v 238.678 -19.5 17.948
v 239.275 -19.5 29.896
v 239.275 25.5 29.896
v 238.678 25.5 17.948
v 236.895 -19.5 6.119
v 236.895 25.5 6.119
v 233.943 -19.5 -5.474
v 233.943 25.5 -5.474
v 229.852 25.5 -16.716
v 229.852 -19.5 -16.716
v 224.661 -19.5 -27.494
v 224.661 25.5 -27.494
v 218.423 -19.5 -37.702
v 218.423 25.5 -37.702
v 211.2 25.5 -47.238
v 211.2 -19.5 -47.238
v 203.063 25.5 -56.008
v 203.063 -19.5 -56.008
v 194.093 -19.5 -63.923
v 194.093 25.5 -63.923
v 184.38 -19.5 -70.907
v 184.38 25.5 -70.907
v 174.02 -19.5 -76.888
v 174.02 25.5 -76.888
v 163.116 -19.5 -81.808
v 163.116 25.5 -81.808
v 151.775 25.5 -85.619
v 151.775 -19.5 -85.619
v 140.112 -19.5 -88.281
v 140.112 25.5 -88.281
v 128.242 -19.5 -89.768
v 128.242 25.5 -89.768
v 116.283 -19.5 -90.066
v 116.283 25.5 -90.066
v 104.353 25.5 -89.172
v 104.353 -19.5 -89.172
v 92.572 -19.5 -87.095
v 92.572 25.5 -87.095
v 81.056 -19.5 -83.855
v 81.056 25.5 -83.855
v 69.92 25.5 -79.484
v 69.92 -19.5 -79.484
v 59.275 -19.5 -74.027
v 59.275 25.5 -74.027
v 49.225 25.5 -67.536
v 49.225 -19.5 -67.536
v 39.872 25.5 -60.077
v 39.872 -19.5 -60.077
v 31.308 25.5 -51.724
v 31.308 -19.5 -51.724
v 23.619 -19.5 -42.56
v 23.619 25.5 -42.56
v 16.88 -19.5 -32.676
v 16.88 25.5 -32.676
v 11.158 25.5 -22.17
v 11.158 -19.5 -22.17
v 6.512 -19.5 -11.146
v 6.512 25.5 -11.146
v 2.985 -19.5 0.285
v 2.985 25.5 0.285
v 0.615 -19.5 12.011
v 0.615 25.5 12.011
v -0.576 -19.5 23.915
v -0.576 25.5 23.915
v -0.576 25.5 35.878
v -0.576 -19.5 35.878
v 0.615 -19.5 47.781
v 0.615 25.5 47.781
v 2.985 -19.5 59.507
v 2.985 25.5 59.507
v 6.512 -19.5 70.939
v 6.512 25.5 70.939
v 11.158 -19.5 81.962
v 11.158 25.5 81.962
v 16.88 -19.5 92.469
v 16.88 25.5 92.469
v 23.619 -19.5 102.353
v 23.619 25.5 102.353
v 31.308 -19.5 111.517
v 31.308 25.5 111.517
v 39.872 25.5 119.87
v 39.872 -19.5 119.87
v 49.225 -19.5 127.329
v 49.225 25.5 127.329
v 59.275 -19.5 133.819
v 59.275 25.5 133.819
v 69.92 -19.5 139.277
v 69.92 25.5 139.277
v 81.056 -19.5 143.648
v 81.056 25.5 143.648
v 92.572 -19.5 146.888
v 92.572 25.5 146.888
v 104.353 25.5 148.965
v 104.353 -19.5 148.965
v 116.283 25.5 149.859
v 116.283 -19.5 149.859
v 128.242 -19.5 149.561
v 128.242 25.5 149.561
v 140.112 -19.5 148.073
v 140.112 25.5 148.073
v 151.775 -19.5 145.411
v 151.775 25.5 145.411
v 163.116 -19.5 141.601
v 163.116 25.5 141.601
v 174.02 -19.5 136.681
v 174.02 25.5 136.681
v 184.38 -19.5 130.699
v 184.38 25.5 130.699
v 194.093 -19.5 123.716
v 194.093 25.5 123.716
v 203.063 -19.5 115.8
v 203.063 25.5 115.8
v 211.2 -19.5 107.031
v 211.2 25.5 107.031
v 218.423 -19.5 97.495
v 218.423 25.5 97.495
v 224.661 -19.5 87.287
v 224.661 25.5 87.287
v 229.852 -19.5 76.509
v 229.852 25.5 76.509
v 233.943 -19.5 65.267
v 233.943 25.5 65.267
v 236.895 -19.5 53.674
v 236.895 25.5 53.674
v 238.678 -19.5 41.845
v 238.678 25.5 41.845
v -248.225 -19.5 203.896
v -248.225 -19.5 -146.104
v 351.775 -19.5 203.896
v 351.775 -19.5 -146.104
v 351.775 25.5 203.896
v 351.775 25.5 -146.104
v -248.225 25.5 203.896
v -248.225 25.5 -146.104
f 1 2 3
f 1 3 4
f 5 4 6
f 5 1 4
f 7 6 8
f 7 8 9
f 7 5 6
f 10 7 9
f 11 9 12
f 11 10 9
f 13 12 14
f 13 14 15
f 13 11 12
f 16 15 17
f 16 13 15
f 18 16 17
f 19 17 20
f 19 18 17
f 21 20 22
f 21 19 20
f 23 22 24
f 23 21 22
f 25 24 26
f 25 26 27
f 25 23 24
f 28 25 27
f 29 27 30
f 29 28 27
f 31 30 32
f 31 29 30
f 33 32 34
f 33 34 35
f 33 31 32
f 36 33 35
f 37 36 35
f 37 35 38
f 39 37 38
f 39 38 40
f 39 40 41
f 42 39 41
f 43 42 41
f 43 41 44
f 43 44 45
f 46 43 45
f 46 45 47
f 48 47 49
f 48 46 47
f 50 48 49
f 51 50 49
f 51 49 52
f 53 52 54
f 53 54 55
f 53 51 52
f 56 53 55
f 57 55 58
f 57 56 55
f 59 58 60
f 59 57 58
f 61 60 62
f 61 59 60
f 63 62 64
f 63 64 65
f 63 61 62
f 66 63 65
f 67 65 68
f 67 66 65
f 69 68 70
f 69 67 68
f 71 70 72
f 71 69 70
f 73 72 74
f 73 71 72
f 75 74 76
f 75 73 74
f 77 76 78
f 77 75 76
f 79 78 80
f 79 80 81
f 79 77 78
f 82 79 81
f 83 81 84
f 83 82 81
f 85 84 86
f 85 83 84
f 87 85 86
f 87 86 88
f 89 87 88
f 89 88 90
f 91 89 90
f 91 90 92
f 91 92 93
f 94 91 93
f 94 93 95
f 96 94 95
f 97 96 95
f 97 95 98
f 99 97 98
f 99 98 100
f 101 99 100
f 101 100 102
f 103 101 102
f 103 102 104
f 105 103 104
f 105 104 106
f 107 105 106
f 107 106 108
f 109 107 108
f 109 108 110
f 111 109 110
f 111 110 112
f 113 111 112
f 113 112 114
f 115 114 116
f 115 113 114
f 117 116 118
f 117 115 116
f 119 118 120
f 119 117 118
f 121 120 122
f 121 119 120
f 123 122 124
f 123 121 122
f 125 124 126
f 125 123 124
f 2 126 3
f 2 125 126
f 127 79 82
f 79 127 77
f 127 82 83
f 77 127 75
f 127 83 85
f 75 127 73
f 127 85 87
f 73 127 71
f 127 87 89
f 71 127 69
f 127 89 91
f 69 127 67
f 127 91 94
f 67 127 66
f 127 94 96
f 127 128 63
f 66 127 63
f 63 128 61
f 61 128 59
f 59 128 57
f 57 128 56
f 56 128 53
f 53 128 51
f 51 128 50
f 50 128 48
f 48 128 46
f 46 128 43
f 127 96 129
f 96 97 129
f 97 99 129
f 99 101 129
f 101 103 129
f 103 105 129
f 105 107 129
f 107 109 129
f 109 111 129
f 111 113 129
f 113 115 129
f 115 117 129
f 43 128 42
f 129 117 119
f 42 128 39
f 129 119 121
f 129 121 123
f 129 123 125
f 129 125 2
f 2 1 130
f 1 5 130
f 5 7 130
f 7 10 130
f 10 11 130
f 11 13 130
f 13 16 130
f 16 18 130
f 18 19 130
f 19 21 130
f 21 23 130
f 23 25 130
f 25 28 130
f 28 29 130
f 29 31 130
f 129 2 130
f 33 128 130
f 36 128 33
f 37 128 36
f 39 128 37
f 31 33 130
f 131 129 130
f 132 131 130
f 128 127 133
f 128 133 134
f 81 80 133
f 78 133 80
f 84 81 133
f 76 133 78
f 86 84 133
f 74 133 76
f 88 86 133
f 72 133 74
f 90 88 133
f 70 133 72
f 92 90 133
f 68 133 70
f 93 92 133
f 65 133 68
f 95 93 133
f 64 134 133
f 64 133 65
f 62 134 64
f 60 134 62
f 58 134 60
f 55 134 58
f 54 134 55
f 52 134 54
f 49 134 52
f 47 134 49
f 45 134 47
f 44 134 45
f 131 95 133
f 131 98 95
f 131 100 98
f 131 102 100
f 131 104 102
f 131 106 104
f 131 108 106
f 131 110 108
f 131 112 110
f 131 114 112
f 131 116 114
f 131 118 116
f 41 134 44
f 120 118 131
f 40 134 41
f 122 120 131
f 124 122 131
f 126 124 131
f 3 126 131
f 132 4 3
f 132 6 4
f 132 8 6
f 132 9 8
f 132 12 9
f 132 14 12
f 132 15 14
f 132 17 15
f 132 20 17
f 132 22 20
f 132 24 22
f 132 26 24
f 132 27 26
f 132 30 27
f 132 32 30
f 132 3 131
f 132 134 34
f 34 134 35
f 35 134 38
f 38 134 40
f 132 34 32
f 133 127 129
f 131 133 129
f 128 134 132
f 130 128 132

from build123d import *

# Parameters (mm, degrees)
SKETCH1_W           = 80
SKETCH1_H           = 60
SKETCH1_R           = 16
BOSS_EXTRUDE1_DEPTH = 6
SCALE1_SCALE        = 7.5
SKETCH2_W           = 741.9419144
SKETCH2_H           = 114.286704827
CUT_EXTRUDE1_DEPTH  = 46


with BuildPart() as part:
    # Sketch1 → Boss-Extrude1 (new body)
    with BuildSketch(Plane(origin=(0, 0, 0), x_dir=(1, 0, 0), z_dir=(0, 1, 0))):
        with Locations((40, 30)):
            Rectangle(SKETCH1_W, SKETCH1_H)
        with Locations((49, 23.2)):
            Circle(SKETCH1_R, mode=Mode.SUBTRACT)
    extrude(amount=BOSS_EXTRUDE1_DEPTH)


with BuildPart() as part_1:
    # Scale1: scaled about (38.188518966, 3, -31.368674559)
    add(part.part.scale(SCALE1_SCALE).moved(Location((-248.225373279, -19.5, 203.896384633))))

    # Sketch2 → Cut-Extrude1 (cut, through all)
    with BuildSketch(Plane(origin=(0, 25.5, 0), x_dir=(1, 0, 0), z_dir=(0, 1, 0))):
        with Locations((57.597106318, 203.246967778)):
            Rectangle(SKETCH2_W, SKETCH2_H)
    extrude(amount=-CUT_EXTRUDE1_DEPTH, mode=Mode.SUBTRACT)


solid = part_1.part
